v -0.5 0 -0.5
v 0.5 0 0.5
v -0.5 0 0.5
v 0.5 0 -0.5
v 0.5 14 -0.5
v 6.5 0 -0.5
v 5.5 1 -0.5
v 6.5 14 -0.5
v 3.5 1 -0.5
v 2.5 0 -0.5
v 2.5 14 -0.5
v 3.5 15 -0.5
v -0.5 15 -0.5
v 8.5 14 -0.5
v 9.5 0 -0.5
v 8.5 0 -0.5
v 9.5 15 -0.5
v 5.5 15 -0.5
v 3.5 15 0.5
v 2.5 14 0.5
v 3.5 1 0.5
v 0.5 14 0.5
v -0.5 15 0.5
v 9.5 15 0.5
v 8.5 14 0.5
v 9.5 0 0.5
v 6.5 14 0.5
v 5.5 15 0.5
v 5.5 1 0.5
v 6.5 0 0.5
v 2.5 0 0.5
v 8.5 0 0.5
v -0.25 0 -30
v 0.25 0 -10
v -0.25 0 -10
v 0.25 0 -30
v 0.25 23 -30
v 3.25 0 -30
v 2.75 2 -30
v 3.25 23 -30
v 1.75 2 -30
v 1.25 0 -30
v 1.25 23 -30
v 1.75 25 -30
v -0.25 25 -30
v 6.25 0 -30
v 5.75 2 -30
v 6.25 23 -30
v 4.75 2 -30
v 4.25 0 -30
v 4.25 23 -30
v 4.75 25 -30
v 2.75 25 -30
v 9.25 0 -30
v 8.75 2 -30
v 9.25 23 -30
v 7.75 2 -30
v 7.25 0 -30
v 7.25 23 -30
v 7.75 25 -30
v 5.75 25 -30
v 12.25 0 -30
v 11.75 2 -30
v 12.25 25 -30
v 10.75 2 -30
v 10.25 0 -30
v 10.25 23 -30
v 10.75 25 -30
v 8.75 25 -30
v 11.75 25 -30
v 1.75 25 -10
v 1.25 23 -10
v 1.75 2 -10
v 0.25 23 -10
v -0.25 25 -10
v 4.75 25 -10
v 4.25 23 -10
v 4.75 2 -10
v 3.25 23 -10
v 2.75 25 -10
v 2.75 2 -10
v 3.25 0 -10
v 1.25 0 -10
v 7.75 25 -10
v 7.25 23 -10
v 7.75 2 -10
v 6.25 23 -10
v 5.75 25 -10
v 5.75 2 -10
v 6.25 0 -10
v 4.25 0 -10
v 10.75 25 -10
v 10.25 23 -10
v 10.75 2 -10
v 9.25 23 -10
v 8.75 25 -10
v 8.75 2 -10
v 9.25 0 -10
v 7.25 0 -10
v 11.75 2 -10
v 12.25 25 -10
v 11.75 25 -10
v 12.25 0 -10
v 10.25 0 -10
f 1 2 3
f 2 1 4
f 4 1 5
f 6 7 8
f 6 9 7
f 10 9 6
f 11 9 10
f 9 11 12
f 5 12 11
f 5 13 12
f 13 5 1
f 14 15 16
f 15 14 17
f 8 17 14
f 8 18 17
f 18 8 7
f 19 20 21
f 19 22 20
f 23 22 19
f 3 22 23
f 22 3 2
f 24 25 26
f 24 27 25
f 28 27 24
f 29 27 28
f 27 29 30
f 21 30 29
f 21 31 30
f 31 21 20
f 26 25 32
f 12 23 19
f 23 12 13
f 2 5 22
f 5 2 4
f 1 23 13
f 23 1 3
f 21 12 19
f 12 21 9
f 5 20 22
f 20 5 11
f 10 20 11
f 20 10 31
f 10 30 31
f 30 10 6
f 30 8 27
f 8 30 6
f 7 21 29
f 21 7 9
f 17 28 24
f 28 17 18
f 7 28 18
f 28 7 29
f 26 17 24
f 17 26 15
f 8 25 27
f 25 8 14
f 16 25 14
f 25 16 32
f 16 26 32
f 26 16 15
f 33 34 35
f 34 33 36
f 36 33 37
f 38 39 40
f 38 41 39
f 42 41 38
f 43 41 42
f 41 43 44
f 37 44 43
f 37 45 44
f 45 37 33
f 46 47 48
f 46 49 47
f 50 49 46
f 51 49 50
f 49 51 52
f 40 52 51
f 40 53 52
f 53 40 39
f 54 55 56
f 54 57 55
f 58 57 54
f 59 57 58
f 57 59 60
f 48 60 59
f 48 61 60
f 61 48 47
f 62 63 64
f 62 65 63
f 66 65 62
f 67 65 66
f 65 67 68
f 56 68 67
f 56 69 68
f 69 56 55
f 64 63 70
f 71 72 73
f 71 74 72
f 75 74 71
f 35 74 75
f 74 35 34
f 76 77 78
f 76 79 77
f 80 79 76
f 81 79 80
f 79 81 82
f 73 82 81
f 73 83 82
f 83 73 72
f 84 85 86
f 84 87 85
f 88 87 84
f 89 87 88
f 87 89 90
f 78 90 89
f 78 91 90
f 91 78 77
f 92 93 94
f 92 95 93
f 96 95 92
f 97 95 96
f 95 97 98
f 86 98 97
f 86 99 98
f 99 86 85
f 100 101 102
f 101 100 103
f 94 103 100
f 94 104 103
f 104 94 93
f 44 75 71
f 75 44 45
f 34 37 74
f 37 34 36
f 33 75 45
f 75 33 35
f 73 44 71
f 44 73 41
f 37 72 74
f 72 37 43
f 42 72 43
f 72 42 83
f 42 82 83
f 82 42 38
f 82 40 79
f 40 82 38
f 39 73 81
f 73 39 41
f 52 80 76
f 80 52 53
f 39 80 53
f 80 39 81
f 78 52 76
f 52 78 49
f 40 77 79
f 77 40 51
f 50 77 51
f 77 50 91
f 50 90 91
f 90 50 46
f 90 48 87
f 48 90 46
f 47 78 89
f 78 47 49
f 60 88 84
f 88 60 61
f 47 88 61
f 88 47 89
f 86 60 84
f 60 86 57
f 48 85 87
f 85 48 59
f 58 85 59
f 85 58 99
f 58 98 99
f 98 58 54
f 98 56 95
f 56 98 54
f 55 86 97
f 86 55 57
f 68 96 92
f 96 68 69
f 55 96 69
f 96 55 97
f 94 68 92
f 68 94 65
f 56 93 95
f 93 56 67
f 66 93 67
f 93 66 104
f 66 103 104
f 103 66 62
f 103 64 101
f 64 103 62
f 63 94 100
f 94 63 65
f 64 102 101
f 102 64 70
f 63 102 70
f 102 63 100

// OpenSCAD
/*--------------------------------------------------------------------------------------
/ Serpentine channel module based on the polychannel module.
/
/ Serpentine long channel axis is y. As more long channel segments are added,
/ the serpentine channel grows in x. 
/
/ See serpentine_algorithm.jpg to see the method used by this code.
/
/ Rev. 1, 9/28/22, by G. Nordin
/ Rev. 2, 11/23/23, by G. Nordin - change to use latest version of polychannel
--------------------------------------------------------------------------------------*/
use <polychannel.scad>

// Functions to help create the relative positions for the long
// serpentine channel segments.
function serp_rel_x_pos(n, lx) = n == 0
    ? 0
    : lx * ((n+1) % 2);

function sign(n) = (n+1) % 4 == 0
    ? -1
    : 1;

function serp_rel_y_pos(n, ly) = ly * (n%2) * sign(n);

echo([for (i = [0:1:7]) serp_rel_x_pos(i, 2)]);
echo([for (i = [0:1:7]) sign(i)]);
echo([for (i = [0:1:7]) serp_rel_y_pos(i, 3)]);
echo([for (i = [0:1:7]) [serp_rel_x_pos(i, 2), serp_rel_y_pos(i, 3), 0]]);

// Main serpentine channel module
module serpentine_channel(
    n = 4,              // Number of serpentine segments
    l = 15,             // Length of serpentine segment
    size = [1, 1, 1],   // Size of channel in x,y,z
    gap = 2,            // Gap between serpentine segments
    clr = "lightblue"   // Color
) {
    n_serp_segments = n;
    n_gap_segments = n_serp_segments - 1;
    n_positions = n_serp_segments + n_gap_segments + 1;
    // echo("n_serp_segments:", n_serp_segments);
    // echo("n_gap_segments:", n_gap_segments);
    // echo("n_positions:", n_positions);

    lx = gap + size[0];
    ly = l - size[1];
    // echo("lx, ly", lx, ly);

    params = [
        for (i=[0: 1: n_positions-1]) ["cube", size, [serp_rel_x_pos(i, lx), serp_rel_y_pos(i, ly), 0], no_rot()]
    ];
    translate([0, 0.5*size[1], 0]) polychannel(params, clr=clr);
}

// Example usage - see serpentine_result.png for output
serpentine_channel();
size = [0.5, 2, 20];
translate([0, 0, -20]) serpentine_channel(n=9, l=25, size=size, gap=1, clr="Salmon");
echo("");
